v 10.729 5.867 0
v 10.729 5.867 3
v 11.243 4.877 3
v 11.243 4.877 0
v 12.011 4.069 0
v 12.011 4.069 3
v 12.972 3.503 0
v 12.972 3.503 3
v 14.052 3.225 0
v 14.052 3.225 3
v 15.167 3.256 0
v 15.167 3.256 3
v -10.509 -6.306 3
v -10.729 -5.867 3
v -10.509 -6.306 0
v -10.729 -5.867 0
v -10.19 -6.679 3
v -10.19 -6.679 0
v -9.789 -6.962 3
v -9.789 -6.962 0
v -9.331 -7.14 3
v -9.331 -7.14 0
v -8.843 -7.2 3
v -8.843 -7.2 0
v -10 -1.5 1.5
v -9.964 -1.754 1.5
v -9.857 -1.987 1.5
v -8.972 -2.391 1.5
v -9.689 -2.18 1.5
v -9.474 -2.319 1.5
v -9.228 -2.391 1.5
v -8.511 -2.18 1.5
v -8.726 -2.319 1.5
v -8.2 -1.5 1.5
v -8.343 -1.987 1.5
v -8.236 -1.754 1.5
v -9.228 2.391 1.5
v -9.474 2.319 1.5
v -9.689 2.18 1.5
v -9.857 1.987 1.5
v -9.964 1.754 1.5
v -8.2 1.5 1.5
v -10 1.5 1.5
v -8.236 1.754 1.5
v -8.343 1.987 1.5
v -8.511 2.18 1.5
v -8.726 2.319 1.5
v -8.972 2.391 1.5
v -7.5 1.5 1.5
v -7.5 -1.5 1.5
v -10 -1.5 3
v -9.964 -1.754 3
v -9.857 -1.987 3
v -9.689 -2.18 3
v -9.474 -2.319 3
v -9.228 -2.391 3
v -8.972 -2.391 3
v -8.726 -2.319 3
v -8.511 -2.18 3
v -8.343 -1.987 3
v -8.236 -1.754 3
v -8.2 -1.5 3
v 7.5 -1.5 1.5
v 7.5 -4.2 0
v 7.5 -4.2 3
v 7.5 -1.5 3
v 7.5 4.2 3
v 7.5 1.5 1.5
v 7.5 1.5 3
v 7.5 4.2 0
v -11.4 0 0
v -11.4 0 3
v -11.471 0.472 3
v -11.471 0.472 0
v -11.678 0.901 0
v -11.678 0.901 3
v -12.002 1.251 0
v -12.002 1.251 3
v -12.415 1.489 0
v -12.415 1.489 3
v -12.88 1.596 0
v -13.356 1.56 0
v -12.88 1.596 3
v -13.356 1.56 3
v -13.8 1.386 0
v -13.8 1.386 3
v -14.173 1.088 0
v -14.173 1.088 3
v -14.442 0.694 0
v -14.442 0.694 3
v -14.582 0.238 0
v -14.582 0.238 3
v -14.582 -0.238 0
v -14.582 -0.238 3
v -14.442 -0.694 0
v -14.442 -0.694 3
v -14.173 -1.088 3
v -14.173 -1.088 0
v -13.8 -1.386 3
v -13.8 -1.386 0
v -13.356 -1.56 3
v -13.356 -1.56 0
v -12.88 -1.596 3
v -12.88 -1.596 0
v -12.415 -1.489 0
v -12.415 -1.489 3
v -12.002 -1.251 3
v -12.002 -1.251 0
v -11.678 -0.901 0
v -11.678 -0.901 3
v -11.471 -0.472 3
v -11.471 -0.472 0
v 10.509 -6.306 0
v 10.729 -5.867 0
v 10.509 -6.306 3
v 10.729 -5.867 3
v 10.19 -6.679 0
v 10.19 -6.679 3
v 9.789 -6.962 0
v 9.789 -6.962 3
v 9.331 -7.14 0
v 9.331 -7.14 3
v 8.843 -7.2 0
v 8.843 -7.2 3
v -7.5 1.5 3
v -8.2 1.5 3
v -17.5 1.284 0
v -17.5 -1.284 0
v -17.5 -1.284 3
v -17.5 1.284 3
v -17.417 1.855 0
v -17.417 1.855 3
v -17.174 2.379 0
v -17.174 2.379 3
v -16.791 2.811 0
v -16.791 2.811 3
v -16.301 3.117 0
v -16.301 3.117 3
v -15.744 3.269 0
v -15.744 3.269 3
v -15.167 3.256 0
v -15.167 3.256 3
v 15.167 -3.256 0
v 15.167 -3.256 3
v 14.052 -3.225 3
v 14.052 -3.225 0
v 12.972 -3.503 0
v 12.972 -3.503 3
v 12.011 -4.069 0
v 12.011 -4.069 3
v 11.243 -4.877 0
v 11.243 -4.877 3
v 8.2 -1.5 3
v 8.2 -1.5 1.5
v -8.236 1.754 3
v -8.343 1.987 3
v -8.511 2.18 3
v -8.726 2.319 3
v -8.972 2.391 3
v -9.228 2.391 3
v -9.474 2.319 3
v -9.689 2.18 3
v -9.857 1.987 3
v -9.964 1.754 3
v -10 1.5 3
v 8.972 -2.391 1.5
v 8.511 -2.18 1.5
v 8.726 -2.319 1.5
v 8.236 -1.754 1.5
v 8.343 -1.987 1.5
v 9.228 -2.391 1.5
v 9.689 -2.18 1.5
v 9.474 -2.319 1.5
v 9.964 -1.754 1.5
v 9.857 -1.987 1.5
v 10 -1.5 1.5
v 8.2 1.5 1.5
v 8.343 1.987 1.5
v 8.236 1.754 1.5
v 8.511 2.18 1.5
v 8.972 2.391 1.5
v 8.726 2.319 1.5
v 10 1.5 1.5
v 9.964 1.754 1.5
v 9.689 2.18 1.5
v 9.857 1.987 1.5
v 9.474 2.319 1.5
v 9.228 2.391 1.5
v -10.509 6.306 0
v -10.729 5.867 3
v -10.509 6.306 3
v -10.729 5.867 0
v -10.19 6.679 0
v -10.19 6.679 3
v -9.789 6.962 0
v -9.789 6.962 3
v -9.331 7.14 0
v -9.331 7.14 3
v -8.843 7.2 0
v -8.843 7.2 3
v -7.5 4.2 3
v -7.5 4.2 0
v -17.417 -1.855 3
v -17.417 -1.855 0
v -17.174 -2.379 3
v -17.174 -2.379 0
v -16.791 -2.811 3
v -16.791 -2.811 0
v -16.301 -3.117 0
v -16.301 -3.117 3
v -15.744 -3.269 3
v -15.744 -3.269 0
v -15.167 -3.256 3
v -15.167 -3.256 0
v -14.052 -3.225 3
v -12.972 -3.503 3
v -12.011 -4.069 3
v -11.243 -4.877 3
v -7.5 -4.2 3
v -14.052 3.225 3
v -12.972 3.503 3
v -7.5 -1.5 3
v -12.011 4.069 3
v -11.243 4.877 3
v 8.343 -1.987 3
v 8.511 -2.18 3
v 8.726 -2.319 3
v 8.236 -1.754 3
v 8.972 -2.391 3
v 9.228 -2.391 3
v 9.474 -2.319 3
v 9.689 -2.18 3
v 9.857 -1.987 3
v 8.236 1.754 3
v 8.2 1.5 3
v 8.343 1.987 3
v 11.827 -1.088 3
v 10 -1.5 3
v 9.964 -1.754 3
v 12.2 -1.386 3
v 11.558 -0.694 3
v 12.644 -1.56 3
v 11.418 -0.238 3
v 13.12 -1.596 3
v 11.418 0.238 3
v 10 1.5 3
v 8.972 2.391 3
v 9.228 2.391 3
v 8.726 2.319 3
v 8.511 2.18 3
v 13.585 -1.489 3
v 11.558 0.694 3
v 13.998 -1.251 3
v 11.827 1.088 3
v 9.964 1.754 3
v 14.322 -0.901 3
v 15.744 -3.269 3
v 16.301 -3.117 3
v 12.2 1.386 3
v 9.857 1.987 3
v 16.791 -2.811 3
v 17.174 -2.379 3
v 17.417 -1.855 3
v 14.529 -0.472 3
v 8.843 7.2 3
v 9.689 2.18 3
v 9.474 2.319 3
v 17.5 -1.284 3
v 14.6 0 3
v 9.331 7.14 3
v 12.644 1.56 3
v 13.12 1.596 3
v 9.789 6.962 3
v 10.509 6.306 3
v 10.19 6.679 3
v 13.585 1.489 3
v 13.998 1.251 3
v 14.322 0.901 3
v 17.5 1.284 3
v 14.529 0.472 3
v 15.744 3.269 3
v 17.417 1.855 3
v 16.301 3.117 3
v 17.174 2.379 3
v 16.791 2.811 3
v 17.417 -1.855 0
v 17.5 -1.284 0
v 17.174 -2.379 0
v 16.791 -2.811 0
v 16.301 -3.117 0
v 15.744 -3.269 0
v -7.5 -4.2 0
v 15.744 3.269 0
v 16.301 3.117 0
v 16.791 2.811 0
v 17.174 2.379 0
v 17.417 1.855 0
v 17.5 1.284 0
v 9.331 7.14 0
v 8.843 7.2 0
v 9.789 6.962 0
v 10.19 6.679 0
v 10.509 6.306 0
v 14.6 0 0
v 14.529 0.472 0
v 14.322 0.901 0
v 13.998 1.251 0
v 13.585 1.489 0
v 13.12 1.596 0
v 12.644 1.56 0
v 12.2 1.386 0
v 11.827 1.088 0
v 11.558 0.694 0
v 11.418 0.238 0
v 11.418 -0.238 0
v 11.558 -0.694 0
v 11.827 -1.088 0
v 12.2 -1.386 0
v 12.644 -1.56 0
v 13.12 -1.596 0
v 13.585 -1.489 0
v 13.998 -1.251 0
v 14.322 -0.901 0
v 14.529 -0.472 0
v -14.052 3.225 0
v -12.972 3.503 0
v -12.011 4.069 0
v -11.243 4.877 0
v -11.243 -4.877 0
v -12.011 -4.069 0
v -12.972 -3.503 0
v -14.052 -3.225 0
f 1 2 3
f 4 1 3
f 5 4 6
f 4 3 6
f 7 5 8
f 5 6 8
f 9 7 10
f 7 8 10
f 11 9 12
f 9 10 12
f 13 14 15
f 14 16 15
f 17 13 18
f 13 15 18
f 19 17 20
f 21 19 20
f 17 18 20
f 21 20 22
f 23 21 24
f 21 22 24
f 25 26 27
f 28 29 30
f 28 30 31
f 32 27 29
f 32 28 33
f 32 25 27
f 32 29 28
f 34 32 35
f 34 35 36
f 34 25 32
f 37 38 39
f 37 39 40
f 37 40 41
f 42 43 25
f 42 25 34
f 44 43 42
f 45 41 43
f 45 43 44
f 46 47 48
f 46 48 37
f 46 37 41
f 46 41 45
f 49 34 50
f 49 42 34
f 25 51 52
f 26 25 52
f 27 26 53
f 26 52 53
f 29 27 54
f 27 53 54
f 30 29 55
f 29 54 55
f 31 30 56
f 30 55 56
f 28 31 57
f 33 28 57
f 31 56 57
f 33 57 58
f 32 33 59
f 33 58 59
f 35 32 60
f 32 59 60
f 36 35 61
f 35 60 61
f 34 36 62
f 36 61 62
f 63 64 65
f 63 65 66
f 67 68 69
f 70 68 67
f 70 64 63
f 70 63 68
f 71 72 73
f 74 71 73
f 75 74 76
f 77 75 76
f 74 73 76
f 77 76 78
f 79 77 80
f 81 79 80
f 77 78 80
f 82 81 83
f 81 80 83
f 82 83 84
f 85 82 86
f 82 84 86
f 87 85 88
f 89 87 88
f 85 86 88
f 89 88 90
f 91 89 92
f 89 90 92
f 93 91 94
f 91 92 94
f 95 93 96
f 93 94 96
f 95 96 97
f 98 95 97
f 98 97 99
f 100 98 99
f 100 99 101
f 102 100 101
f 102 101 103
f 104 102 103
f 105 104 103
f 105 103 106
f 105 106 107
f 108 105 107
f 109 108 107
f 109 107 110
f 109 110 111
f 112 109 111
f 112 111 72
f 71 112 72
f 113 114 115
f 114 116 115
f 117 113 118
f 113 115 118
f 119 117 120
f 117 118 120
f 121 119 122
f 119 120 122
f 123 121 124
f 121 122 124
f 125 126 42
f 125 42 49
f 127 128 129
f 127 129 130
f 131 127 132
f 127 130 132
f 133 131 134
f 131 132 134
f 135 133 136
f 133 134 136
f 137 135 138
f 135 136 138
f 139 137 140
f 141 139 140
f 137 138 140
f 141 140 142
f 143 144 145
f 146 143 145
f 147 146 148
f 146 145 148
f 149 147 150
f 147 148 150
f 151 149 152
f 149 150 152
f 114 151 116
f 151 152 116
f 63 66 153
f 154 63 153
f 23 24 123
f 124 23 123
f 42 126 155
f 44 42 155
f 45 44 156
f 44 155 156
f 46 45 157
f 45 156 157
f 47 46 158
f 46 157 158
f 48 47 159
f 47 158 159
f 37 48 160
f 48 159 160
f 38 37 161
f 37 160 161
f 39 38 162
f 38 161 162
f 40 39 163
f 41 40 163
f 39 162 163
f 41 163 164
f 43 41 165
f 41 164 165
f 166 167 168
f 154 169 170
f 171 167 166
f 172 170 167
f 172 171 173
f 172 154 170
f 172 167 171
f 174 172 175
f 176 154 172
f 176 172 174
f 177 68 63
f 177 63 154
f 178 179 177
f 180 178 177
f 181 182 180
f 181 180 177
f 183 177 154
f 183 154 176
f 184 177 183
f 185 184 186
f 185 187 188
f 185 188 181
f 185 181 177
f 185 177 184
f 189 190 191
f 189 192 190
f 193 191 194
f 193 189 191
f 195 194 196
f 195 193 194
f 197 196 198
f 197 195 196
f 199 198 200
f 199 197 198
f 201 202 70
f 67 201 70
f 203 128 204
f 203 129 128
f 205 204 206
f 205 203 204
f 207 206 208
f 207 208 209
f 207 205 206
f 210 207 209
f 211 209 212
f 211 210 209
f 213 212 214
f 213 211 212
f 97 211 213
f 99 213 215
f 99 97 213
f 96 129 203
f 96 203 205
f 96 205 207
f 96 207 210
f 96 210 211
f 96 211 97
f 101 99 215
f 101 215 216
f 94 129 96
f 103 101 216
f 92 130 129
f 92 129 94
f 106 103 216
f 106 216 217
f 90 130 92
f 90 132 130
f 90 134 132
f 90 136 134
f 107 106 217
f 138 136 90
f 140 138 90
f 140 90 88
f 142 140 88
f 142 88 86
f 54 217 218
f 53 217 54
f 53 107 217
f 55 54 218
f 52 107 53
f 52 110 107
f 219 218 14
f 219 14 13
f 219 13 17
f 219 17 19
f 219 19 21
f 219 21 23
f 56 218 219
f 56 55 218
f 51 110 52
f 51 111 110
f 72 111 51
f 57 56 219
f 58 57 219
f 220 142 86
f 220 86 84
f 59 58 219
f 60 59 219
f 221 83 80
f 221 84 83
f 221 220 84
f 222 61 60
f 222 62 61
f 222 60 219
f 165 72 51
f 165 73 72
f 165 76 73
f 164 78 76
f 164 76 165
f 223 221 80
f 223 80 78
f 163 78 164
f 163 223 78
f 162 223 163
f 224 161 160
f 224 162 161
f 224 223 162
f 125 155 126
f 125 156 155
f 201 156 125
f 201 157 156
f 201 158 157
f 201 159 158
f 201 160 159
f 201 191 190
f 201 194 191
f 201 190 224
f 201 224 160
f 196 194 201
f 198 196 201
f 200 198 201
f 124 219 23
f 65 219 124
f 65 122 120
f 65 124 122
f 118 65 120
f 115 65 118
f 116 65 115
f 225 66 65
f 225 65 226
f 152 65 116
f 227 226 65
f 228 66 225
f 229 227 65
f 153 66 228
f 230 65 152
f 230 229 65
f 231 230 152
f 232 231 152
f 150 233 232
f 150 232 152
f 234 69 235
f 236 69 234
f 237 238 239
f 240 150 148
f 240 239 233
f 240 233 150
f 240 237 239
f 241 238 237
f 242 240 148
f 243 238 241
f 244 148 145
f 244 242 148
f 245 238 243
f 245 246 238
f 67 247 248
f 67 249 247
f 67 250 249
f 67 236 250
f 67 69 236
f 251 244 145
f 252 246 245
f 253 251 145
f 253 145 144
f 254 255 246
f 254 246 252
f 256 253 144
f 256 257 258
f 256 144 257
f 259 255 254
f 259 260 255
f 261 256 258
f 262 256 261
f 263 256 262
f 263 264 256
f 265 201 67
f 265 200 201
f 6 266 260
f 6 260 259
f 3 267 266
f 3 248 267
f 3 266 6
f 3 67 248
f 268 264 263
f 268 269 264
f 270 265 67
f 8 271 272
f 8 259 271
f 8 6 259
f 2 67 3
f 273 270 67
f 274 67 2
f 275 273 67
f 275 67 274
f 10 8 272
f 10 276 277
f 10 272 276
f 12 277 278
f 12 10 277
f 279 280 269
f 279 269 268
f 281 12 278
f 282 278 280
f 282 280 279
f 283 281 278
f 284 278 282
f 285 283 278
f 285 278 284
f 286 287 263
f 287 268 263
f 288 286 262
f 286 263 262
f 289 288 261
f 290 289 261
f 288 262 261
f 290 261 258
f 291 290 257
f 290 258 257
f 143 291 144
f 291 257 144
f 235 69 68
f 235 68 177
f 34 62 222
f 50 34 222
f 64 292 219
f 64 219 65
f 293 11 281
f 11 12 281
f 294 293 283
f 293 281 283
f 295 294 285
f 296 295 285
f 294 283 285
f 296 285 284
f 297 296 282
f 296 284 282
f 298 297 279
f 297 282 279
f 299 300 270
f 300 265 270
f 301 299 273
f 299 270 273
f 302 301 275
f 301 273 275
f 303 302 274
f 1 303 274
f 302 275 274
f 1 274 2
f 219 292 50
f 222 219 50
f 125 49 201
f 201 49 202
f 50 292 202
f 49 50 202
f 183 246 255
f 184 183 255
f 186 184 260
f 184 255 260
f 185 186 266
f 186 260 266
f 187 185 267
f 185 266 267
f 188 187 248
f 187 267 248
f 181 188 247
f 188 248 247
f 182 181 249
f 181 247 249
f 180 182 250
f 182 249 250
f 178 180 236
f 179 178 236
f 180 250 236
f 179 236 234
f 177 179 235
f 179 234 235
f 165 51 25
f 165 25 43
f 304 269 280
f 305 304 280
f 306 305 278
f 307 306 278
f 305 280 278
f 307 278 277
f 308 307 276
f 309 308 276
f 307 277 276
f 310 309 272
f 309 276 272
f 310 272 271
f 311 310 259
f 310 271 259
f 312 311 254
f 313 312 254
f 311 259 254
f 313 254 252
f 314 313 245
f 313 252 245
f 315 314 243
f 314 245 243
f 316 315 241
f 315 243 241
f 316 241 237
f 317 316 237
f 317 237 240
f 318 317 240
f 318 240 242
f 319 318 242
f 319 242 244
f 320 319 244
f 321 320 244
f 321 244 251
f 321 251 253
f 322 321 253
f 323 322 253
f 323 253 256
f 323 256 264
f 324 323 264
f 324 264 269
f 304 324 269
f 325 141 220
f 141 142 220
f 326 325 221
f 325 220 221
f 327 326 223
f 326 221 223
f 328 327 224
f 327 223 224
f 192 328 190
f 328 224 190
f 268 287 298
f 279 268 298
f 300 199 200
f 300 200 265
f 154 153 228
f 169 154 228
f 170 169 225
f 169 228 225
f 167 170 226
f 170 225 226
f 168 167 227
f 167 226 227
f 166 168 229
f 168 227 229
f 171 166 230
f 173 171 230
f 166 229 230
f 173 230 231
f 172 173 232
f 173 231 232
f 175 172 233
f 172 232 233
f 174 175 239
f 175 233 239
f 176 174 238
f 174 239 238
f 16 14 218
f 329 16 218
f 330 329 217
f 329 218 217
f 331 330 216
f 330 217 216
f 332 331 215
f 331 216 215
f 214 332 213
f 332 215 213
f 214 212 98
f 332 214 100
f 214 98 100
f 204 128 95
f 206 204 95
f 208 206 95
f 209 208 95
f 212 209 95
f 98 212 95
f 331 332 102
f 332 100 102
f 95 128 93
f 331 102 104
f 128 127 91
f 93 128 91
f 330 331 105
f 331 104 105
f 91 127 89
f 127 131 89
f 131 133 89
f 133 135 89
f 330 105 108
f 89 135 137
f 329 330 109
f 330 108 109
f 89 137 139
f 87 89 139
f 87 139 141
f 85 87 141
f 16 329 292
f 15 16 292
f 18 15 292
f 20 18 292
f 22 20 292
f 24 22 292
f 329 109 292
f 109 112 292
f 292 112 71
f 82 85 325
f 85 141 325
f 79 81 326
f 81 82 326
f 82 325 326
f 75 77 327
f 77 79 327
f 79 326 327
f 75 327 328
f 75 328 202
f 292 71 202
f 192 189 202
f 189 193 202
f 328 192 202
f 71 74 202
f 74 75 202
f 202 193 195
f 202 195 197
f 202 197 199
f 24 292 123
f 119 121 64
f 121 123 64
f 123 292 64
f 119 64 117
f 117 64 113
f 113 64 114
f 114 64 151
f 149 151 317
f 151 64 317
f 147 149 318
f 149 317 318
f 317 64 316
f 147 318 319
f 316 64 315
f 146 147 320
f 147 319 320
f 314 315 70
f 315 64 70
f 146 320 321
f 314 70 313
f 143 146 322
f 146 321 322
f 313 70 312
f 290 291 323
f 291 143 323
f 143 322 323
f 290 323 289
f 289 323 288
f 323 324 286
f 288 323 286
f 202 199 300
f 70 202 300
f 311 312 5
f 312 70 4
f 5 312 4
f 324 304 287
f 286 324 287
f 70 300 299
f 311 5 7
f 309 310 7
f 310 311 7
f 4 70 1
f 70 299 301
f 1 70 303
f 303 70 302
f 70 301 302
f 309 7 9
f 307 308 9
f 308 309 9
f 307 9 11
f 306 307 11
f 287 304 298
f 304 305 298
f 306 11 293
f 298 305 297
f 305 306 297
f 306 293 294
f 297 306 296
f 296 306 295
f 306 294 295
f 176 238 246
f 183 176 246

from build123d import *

# Parameters (mm, degrees)
SKETCH_1_W          = 35
SKETCH_1_H          = 14.4
SKETCH_1_W_2        = 15
SKETCH_1_H_2        = 8.4
EXTRUDE_1_DEPTH     = 3
SKETCH_2_W          = 20
SKETCH_2_H          = 3
CUT_EXTRUDE_1_DEPTH = 1.5
SKETCH_3_R          = 1.6
CUT_EXTRUDE_2_DEPTH = 20
SKETCH_5_R          = 4
CUT_EXTRUDE_4_DEPTH = 10
FILLET_2_R          = 2
SKETCH_6_R          = 0.9
CUT_EXTRUDE_5_DEPTH = 1.5


with BuildPart() as part:
    # 草图1 → 凸台-拉伸1 (new body)
    with BuildSketch(Plane.XY):
        Rectangle(SKETCH_1_W, SKETCH_1_H)
        Rectangle(SKETCH_1_W_2, SKETCH_1_H_2, mode=Mode.SUBTRACT)
    extrude(amount=EXTRUDE_1_DEPTH)

    # 草图2 → 切除-拉伸1 (cut)
    with BuildSketch(Plane.XY.offset(3)):
        Rectangle(SKETCH_2_W, SKETCH_2_H)
    extrude(amount=-CUT_EXTRUDE_1_DEPTH, mode=Mode.SUBTRACT)

    # 草图3 → 切除-拉伸2 (cut)
    with BuildSketch(Plane.XY.offset(3)):
        with Locations((-13, 0)):
            Circle(SKETCH_3_R)
        with Locations((13, 0)):
            Circle(SKETCH_3_R)
    extrude(amount=-CUT_EXTRUDE_2_DEPTH, mode=Mode.SUBTRACT)

    # 草图5 → 切除-拉伸4 (cut)
    with BuildSketch(Plane.XY.offset(3)):
        with Locations((-14.5, 7.2)):
            Circle(SKETCH_5_R)
        with Locations((14.5, 7.2)):
            Circle(SKETCH_5_R)
        with Locations((14.5, -7.2)):
            Circle(SKETCH_5_R)
        with Locations((-14.5, -7.2)):
            Circle(SKETCH_5_R)
    extrude(amount=-CUT_EXTRUDE_4_DEPTH, mode=Mode.SUBTRACT)

    # 圆角2
    fillet_2_edges = [part.edges().sort_by_distance(p)[0] for p in [
        (10.5, -7.2, 1.5),
        (-10.5, -7.2, 1.5),
        (-17.5, 4.554248689, 1.5),
        (10.5, 7.2, 1.5),
        (-17.5, -4.554248689, 1.5),
        (17.5, -4.554248689, 1.5),
        (17.5, 4.554248689, 1.5),
        (-10.5, 7.2, 1.5),
    ]]
    fillet(fillet_2_edges, radius=FILLET_2_R)

    # 草图6 → 切除-拉伸5 (cut)
    with BuildSketch(Plane.XY.offset(3)):
        with Locations((-9.1, 1.5)):
            Circle(SKETCH_6_R)
        with Locations((-9.1, -1.5)):
            Circle(SKETCH_6_R)
        with Locations((9.1, 1.5)):
            Circle(SKETCH_6_R)
        with Locations((9.1, -1.5)):
            Circle(SKETCH_6_R)
    extrude(amount=-CUT_EXTRUDE_5_DEPTH, mode=Mode.SUBTRACT)


solid = part.part
